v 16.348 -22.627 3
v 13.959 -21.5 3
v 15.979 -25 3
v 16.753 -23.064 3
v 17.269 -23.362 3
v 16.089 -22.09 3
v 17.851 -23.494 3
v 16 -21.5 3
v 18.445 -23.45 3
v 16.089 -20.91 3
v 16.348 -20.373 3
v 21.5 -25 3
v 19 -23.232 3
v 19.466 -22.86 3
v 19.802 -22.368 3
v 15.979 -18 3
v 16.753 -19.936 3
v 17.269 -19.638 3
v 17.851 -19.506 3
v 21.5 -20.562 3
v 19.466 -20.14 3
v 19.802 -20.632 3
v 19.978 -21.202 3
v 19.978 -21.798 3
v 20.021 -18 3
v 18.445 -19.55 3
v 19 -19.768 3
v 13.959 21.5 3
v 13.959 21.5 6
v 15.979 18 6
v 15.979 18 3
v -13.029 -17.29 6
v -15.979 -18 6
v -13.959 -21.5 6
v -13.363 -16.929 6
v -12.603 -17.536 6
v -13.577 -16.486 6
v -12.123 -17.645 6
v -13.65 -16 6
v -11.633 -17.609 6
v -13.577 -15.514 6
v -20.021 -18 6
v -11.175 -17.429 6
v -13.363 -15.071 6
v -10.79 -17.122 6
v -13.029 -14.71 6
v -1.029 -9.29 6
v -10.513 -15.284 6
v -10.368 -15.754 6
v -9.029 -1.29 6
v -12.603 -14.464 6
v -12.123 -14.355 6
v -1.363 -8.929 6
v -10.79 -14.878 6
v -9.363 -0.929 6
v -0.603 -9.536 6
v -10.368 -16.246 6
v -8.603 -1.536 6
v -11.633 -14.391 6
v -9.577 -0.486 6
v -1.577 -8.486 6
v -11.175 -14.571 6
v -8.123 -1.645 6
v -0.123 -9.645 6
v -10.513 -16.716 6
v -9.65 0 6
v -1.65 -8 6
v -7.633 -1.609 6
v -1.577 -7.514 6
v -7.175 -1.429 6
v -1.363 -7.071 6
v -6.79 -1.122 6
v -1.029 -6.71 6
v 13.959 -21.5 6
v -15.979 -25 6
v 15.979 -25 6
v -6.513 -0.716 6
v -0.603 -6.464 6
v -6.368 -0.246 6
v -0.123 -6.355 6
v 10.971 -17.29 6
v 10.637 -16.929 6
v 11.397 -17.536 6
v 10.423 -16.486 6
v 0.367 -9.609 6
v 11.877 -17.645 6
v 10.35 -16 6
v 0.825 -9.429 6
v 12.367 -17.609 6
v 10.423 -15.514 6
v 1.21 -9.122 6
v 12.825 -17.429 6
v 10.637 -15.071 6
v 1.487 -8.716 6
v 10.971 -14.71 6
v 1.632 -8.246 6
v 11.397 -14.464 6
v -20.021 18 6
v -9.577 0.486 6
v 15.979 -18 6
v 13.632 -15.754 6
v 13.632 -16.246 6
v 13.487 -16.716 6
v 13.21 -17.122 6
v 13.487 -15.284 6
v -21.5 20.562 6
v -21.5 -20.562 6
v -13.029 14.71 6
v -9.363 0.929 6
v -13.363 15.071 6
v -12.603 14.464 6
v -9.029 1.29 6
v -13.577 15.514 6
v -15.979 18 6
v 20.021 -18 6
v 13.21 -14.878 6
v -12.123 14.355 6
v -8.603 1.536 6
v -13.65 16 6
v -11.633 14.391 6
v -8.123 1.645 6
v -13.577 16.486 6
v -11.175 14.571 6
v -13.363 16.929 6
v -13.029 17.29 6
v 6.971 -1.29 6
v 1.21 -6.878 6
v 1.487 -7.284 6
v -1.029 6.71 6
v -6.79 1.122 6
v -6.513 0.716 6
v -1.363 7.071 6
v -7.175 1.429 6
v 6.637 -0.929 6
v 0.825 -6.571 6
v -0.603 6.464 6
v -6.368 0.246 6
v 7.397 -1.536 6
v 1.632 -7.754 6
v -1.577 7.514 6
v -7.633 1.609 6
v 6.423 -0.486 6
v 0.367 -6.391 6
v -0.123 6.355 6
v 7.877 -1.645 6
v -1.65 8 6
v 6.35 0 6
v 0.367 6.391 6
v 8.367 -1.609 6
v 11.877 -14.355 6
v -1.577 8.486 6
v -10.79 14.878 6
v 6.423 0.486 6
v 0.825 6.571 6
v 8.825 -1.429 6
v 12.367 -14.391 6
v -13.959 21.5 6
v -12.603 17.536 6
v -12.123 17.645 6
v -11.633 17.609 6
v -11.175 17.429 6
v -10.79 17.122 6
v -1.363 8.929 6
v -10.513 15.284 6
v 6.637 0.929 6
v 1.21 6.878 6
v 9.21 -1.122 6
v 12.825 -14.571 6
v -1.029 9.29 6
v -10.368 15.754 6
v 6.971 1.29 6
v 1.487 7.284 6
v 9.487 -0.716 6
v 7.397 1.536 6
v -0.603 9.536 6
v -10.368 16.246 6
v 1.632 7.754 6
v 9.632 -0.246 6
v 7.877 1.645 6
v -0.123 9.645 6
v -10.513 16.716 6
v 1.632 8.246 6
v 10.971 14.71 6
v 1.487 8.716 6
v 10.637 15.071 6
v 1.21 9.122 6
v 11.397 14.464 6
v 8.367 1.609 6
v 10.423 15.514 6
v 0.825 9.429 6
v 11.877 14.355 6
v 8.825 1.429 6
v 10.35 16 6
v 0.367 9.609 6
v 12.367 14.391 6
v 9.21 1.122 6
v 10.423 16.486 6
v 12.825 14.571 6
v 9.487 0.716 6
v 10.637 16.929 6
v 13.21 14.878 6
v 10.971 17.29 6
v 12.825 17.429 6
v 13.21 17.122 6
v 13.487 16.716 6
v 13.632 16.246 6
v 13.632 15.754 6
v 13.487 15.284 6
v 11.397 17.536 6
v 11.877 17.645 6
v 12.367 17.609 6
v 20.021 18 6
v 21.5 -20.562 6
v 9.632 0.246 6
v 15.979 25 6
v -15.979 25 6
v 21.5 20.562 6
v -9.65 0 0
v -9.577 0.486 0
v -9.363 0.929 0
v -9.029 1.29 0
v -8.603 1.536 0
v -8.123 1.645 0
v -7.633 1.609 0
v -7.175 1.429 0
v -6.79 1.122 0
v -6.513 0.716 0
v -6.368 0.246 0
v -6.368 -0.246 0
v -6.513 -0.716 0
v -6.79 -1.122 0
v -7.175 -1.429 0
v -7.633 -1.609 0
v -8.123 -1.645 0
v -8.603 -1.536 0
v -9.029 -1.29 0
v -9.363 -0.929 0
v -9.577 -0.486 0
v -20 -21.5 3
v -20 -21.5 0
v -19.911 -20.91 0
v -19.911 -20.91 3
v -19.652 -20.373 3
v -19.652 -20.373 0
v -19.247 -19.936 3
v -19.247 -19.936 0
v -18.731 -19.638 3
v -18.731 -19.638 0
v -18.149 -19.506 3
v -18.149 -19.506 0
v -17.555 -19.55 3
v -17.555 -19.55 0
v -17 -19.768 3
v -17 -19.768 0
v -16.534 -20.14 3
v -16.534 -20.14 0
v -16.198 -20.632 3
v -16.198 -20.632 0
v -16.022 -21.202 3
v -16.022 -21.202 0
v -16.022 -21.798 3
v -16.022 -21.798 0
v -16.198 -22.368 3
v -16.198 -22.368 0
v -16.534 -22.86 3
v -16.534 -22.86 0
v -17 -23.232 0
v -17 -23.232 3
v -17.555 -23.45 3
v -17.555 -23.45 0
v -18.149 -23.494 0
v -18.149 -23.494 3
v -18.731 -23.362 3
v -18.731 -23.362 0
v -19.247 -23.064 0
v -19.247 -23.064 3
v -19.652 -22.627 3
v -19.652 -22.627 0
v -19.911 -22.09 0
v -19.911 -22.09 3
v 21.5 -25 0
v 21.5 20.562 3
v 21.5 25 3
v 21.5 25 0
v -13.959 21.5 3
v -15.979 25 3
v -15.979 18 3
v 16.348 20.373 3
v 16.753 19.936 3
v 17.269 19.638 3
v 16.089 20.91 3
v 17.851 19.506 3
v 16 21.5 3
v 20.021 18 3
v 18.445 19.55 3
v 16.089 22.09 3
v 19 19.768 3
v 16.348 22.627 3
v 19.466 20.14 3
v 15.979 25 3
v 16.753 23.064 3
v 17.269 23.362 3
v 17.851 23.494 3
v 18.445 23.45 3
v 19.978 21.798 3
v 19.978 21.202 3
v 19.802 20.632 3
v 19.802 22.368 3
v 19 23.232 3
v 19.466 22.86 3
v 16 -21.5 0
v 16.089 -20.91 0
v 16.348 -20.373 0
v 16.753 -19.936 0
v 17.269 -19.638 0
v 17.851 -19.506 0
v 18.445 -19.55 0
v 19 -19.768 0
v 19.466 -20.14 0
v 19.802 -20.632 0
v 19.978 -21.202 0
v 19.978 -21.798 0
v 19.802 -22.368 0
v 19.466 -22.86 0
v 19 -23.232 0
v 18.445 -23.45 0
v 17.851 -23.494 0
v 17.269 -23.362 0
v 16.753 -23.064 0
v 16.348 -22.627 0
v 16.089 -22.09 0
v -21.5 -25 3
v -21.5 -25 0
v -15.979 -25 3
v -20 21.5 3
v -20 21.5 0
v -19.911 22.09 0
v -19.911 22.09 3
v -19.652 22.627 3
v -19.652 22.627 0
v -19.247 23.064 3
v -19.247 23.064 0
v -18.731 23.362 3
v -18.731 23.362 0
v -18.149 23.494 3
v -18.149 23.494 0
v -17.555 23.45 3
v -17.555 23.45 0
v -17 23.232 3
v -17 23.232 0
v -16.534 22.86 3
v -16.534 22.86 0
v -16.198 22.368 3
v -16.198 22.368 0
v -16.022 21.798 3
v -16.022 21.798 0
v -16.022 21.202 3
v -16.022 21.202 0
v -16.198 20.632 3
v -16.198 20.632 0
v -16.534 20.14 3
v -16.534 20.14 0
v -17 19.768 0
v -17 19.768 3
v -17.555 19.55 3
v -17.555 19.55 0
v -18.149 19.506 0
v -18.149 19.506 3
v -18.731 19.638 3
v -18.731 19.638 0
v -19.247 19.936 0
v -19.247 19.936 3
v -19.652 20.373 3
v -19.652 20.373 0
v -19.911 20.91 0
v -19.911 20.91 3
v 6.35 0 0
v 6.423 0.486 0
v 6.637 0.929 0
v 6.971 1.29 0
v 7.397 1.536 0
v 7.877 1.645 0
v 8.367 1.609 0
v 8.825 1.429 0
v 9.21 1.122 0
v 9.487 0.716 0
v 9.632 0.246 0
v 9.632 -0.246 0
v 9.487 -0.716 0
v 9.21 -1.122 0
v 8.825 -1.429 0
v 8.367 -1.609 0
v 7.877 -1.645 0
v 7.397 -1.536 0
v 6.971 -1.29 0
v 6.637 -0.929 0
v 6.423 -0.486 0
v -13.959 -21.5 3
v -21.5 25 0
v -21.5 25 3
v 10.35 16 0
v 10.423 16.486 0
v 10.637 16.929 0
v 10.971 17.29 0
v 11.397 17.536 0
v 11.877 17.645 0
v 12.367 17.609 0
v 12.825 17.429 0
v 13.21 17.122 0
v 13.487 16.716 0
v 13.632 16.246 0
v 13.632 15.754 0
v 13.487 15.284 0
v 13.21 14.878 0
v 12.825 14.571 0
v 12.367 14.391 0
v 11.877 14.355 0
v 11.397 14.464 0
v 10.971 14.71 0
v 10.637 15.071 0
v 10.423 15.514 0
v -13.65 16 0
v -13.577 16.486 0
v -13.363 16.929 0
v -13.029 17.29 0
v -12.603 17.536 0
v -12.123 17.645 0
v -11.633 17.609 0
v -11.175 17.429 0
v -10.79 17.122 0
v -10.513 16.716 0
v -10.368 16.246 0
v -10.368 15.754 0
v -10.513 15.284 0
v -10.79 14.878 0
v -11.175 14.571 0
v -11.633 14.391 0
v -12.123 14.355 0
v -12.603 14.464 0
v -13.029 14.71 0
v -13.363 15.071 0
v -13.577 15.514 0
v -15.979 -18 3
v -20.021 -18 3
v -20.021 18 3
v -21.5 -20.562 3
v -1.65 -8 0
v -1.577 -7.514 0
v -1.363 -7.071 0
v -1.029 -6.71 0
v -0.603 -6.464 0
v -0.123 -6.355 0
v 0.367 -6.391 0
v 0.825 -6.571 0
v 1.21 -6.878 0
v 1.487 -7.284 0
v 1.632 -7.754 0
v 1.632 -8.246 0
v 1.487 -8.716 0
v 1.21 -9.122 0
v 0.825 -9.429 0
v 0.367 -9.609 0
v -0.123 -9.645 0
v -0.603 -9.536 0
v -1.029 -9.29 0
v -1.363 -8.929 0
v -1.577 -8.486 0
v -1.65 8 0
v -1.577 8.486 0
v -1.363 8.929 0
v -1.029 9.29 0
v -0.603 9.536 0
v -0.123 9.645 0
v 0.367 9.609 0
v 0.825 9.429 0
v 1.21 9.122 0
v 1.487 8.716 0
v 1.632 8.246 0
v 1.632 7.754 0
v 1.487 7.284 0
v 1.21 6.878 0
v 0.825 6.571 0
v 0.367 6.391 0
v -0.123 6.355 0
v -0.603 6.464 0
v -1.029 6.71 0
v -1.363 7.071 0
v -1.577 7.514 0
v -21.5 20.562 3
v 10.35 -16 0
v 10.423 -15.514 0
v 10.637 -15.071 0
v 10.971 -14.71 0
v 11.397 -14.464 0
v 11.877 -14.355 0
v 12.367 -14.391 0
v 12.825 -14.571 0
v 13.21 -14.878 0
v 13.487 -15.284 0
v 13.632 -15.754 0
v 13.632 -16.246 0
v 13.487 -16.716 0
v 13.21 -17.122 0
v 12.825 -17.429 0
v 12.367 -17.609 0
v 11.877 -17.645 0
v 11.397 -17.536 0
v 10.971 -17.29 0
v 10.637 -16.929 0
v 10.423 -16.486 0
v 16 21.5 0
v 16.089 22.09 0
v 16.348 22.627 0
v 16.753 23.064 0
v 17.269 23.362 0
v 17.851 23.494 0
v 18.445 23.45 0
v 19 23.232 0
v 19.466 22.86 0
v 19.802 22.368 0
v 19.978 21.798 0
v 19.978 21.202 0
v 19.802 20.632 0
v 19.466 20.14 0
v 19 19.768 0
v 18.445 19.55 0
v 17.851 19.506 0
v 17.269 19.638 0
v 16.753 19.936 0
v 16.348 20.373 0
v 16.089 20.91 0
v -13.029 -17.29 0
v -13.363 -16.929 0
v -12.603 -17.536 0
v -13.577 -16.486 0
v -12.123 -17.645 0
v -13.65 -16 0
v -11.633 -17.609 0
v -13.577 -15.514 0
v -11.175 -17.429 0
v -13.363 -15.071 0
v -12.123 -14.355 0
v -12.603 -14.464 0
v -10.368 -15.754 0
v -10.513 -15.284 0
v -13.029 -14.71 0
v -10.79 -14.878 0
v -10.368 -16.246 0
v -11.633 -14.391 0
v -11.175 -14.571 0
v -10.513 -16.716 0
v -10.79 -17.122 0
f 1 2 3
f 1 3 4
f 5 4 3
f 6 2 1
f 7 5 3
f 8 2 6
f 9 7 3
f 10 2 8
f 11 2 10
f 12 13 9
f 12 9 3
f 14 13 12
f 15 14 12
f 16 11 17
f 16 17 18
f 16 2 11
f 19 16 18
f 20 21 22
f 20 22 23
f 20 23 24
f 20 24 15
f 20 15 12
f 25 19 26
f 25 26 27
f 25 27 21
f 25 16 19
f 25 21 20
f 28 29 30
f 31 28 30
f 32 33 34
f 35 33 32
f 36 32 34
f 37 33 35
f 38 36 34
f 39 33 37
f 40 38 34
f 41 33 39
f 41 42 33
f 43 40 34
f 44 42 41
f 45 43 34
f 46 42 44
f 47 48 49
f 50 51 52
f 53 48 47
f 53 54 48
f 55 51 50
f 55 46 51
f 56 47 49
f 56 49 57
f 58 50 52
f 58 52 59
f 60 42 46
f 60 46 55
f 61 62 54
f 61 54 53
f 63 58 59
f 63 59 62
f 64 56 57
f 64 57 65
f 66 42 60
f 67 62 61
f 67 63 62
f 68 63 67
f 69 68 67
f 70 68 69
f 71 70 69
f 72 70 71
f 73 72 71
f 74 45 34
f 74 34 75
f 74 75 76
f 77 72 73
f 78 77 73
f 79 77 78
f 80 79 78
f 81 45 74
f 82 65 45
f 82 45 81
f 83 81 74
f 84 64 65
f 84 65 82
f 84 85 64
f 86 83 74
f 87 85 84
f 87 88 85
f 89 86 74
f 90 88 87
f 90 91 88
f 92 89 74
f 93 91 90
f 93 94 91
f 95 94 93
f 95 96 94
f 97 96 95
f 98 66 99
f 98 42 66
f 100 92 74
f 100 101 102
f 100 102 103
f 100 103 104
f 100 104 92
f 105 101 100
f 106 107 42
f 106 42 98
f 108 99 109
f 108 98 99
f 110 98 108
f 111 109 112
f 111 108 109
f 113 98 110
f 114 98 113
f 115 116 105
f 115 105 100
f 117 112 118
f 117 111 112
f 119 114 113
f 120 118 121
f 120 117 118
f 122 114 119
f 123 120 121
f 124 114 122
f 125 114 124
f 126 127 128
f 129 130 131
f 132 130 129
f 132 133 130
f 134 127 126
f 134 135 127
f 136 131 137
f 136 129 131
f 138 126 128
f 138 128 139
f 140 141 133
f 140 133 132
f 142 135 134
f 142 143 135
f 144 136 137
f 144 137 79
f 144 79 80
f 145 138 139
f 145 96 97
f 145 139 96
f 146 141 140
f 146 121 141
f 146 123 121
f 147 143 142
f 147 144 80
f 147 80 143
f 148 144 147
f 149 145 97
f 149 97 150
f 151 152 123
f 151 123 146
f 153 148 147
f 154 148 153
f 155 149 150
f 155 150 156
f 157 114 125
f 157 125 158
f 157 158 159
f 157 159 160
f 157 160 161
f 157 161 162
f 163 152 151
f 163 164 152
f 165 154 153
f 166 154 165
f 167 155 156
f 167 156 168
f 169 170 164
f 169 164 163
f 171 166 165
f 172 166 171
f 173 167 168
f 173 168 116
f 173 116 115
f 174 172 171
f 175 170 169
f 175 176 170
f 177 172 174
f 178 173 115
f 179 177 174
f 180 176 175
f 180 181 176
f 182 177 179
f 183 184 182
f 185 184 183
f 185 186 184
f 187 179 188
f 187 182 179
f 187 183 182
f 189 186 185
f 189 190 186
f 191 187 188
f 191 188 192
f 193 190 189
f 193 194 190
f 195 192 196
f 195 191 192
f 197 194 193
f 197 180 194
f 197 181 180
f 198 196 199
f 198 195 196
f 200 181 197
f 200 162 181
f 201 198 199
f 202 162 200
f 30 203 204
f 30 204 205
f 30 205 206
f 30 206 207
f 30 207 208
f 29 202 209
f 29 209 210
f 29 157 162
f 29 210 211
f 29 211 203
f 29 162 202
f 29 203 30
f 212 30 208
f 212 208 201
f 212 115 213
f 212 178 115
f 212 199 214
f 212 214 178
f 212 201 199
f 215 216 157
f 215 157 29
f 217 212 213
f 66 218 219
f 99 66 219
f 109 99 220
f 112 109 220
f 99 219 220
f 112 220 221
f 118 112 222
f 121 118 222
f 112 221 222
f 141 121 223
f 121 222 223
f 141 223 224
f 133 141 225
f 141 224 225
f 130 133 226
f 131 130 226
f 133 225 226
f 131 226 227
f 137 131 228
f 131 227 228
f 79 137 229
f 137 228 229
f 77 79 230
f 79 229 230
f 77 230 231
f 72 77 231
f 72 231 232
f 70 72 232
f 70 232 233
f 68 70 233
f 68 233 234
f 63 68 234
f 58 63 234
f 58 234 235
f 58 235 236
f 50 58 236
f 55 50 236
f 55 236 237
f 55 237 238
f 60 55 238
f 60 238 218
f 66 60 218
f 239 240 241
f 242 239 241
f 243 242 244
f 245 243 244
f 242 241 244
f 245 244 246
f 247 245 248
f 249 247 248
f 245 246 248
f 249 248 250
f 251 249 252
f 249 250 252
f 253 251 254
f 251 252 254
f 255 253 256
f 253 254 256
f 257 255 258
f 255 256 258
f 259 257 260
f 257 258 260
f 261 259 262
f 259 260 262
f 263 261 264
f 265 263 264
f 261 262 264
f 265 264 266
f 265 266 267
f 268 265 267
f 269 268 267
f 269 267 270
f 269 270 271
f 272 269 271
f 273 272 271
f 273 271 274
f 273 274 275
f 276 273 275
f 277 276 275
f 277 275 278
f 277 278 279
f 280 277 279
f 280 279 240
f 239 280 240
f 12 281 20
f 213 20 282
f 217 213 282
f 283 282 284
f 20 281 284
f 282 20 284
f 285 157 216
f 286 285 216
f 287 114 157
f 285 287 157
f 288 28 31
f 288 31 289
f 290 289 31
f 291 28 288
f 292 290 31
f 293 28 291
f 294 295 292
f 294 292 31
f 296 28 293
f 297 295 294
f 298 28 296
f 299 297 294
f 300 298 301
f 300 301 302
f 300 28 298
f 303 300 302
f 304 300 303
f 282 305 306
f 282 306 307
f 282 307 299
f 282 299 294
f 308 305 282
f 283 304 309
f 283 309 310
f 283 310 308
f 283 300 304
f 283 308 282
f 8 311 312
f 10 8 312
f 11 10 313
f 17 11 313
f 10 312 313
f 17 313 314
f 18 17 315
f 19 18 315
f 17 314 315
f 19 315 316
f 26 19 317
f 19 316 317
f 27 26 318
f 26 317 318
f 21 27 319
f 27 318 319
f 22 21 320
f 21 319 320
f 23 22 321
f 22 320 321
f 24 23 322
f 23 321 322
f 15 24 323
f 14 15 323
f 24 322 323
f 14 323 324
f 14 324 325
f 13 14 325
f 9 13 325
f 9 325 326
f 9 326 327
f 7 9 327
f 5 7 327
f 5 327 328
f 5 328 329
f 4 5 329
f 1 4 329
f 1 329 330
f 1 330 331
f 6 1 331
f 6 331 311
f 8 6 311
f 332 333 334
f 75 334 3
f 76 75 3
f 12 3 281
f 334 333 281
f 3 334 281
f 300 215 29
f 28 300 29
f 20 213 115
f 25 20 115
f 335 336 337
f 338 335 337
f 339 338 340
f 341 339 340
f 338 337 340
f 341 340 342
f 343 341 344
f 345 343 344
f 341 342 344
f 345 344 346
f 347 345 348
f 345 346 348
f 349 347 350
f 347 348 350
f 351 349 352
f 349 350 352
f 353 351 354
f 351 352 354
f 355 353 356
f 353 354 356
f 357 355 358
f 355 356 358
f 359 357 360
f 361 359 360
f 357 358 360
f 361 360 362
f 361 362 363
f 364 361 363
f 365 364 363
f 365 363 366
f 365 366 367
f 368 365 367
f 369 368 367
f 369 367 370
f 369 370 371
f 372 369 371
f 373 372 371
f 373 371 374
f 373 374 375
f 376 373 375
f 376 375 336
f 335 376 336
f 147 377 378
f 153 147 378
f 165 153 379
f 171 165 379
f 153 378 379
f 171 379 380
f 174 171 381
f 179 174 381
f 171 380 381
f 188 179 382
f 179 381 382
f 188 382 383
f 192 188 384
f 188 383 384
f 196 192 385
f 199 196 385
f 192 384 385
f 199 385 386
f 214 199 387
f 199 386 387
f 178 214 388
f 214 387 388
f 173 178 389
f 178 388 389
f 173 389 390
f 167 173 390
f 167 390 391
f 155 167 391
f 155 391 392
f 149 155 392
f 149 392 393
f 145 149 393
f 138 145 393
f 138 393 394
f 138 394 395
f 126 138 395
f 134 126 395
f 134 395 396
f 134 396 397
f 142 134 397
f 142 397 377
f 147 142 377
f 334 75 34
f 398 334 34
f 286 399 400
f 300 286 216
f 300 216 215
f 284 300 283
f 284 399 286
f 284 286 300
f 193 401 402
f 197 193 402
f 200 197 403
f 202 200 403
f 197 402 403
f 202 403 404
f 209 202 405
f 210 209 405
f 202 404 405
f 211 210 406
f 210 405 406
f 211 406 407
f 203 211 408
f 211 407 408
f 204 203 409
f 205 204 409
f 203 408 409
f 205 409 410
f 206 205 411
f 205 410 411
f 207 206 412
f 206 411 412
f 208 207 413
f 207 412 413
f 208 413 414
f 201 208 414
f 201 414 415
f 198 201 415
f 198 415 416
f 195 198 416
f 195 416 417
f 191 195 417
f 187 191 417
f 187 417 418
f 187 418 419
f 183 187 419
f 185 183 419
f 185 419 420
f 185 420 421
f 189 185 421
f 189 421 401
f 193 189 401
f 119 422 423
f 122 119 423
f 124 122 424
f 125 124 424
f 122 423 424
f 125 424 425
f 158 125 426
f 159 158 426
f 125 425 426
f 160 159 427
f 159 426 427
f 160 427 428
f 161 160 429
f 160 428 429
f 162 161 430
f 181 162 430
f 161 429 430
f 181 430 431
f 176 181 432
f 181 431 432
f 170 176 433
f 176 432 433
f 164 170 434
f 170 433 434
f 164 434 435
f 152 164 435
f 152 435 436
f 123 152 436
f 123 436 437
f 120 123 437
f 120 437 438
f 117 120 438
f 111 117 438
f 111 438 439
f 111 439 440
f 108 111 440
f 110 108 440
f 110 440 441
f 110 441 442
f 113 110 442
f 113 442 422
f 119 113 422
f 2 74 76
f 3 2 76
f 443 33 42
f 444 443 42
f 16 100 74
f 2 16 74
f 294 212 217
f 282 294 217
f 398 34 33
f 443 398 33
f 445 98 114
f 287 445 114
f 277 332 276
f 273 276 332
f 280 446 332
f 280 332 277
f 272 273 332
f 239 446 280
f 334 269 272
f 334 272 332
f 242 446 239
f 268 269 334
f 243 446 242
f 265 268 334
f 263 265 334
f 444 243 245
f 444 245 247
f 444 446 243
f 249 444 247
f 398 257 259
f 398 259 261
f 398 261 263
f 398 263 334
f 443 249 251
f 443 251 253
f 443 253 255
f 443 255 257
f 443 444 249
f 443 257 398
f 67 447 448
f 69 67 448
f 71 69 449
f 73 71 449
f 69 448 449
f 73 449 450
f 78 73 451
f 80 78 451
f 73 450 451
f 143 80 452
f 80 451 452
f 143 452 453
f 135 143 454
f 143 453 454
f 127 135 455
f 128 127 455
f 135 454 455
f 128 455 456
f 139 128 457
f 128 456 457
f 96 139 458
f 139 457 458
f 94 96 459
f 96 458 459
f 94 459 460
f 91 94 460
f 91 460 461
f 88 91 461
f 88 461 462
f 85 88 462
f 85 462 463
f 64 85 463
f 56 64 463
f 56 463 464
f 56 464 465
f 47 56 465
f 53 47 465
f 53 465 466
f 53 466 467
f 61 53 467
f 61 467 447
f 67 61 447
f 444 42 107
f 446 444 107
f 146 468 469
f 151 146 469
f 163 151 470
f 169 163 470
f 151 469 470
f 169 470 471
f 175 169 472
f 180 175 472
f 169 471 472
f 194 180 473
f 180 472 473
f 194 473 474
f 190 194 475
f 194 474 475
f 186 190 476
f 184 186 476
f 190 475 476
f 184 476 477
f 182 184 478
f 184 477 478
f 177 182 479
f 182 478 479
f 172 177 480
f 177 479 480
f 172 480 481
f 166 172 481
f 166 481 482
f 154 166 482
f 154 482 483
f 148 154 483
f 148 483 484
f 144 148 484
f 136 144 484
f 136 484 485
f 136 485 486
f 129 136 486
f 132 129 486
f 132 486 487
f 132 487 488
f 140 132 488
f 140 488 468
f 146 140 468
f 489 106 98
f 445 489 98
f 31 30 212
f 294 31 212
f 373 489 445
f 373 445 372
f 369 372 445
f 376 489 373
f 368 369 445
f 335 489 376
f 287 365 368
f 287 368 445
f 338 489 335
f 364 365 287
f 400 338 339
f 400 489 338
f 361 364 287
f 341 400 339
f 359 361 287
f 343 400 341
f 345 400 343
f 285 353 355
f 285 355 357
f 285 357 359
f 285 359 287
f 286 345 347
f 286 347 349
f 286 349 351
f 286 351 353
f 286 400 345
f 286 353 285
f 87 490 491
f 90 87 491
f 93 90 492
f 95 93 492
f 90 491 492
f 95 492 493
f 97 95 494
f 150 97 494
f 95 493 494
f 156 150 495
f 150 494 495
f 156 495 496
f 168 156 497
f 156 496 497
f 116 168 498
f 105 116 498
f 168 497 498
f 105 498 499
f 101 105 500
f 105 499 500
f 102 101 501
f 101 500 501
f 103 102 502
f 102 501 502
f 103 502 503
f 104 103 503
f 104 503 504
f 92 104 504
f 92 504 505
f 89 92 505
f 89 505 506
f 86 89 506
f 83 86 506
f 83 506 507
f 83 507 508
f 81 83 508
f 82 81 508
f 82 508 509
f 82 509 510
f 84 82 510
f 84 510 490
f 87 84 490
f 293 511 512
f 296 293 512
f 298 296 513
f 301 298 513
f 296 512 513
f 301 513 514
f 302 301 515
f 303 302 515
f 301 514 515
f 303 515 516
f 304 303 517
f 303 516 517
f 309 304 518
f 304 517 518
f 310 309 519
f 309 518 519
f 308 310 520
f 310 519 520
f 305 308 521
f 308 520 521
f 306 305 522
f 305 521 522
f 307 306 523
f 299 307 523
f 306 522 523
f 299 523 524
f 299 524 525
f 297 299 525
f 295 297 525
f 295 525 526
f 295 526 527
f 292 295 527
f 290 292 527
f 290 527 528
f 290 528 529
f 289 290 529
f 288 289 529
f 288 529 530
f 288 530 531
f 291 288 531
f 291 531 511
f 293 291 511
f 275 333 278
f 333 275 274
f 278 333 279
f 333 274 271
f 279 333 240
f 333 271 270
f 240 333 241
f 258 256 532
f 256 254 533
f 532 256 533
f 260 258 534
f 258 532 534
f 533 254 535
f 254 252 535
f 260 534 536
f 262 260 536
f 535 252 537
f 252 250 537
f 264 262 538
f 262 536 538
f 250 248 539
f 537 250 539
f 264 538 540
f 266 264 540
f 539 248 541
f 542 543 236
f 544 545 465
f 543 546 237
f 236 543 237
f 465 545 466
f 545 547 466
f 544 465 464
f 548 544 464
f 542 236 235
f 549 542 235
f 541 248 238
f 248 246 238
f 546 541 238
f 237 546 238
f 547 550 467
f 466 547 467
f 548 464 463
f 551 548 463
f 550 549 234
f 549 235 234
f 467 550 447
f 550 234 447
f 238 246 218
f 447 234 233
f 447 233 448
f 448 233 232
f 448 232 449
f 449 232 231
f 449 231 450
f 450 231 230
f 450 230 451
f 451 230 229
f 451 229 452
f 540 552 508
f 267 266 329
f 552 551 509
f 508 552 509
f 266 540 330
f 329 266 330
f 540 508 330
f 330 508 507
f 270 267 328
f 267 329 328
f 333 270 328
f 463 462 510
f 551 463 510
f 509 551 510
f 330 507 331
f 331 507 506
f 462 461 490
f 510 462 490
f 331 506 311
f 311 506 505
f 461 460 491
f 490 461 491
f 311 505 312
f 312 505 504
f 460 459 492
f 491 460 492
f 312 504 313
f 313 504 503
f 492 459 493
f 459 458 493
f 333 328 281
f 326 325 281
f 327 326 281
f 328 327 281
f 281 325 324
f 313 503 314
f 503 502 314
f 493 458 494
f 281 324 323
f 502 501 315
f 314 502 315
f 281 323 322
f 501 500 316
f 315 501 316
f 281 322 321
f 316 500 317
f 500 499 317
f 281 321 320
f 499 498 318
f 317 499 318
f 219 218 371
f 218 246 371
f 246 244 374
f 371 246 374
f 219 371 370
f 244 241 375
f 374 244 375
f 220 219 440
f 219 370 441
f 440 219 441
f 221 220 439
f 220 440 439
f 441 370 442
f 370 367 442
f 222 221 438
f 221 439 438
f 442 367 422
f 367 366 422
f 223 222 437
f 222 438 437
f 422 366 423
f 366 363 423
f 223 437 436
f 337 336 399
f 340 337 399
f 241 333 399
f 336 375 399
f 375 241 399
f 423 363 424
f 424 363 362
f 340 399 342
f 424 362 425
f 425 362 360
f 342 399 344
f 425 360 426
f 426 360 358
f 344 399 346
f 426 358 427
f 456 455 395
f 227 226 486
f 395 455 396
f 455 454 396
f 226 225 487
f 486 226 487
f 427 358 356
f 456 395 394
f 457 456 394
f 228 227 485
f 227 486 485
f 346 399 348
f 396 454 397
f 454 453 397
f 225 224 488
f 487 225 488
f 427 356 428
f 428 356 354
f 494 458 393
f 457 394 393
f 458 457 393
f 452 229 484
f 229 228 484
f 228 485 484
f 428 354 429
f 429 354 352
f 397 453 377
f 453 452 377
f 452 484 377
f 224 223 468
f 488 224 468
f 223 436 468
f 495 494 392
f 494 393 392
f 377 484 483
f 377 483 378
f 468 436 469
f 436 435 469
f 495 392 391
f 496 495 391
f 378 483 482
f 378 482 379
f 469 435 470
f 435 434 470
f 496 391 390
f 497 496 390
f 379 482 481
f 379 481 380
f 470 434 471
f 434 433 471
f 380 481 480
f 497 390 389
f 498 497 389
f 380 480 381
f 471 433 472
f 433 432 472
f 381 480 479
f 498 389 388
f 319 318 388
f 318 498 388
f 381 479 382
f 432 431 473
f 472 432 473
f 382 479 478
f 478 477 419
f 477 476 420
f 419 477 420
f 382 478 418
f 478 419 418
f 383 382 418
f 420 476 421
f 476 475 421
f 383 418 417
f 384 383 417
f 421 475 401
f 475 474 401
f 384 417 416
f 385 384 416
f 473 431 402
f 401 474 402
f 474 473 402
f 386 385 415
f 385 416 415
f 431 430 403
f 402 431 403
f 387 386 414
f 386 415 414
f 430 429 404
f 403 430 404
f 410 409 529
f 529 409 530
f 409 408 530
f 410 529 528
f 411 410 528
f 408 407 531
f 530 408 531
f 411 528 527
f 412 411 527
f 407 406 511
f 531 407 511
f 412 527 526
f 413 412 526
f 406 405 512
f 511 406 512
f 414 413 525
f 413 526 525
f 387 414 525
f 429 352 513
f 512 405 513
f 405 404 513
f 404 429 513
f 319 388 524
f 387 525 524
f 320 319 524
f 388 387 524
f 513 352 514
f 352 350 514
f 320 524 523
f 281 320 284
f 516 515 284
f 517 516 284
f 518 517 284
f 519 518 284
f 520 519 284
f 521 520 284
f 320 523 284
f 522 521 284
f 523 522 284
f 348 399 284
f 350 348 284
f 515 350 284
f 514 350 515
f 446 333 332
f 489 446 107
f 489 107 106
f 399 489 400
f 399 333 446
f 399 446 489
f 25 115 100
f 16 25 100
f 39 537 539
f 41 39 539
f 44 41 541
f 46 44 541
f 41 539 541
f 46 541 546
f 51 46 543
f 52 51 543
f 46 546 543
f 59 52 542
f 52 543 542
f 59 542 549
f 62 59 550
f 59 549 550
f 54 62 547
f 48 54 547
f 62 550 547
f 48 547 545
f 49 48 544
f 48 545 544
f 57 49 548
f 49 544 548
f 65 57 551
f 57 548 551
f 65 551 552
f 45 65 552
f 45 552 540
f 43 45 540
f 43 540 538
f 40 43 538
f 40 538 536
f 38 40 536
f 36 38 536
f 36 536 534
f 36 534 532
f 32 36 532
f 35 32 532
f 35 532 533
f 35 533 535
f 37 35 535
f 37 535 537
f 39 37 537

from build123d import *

# Parameters (mm, degrees)
F0_W     = 43
F0_H     = 50
F1_DEPTH = 6
F3_D     = 3.3
F4_DEPTH = 3
F5_D     = 4


with BuildPart() as f1:
    # F0 (on Top) → F1 (new body)
    with BuildSketch(Plane.XY):
        Rectangle(F0_W, F0_H)
    extrude(amount=F1_DEPTH)

    # F3 (through all)
    with Locations(Plane.XY.offset(6)):
        with Locations((-8, 0), (8, 0), (0, 8), (0, -8), (-12, 16), (-12, -16), (12, -16), (12, 16)):
            Hole(F3_D / 2)

    # F2 (on face) → F4 (cut)
    with BuildSketch(Plane.XY.offset(6)):
        Polygon((-20.0207259422, -25), (-15.9792740578, -25), (-13.9585481157, -21.5), (-15.9792740578, -18), (-20.0207259422, -18), (-21.5, -20.5621778265), (-21.5, -22.4378221735), align=None)
        Polygon((-21.5, -25), (-20.0207259422, -25), (-21.5, -22.4378221735), align=None)
        Polygon((13.9585481157, -21.5), (15.9792740578, -25), (20.0207259422, -25), (21.5, -22.4378221735), (21.5, -20.5621778265), (20.0207259422, -18), (15.9792740578, -18), align=None)
        Polygon((21.5, -22.4378221735), (20.0207259422, -25), (21.5, -25), align=None)
        Polygon((20.0207259422, 18), (21.5, 20.5621778265), (21.5, 22.4378221735), (20.0207259422, 25), (15.9792740578, 25), (13.9585481157, 21.5), (15.9792740578, 18), align=None)
        Polygon((20.0207259422, 25), (21.5, 22.4378221735), (21.5, 25), align=None)
        Polygon((-21.5, 22.4378221735), (-21.5, 20.5621778265), (-20.0207259422, 18), (-15.9792740578, 18), (-13.9585481157, 21.5), (-15.9792740578, 25), (-20.0207259422, 25), align=None)
        Polygon((-21.5, 25), (-21.5, 22.4378221735), (-20.0207259422, 25), align=None)
    extrude(amount=-F4_DEPTH, mode=Mode.SUBTRACT)

    # F5 (through all)
    with Locations(Plane.XY.offset(6)):
        with Locations((-18, -21.5), (18, -21.5), (18, 21.5), (-18, 21.5)):
            Hole(F5_D / 2)


solid = f1.part
